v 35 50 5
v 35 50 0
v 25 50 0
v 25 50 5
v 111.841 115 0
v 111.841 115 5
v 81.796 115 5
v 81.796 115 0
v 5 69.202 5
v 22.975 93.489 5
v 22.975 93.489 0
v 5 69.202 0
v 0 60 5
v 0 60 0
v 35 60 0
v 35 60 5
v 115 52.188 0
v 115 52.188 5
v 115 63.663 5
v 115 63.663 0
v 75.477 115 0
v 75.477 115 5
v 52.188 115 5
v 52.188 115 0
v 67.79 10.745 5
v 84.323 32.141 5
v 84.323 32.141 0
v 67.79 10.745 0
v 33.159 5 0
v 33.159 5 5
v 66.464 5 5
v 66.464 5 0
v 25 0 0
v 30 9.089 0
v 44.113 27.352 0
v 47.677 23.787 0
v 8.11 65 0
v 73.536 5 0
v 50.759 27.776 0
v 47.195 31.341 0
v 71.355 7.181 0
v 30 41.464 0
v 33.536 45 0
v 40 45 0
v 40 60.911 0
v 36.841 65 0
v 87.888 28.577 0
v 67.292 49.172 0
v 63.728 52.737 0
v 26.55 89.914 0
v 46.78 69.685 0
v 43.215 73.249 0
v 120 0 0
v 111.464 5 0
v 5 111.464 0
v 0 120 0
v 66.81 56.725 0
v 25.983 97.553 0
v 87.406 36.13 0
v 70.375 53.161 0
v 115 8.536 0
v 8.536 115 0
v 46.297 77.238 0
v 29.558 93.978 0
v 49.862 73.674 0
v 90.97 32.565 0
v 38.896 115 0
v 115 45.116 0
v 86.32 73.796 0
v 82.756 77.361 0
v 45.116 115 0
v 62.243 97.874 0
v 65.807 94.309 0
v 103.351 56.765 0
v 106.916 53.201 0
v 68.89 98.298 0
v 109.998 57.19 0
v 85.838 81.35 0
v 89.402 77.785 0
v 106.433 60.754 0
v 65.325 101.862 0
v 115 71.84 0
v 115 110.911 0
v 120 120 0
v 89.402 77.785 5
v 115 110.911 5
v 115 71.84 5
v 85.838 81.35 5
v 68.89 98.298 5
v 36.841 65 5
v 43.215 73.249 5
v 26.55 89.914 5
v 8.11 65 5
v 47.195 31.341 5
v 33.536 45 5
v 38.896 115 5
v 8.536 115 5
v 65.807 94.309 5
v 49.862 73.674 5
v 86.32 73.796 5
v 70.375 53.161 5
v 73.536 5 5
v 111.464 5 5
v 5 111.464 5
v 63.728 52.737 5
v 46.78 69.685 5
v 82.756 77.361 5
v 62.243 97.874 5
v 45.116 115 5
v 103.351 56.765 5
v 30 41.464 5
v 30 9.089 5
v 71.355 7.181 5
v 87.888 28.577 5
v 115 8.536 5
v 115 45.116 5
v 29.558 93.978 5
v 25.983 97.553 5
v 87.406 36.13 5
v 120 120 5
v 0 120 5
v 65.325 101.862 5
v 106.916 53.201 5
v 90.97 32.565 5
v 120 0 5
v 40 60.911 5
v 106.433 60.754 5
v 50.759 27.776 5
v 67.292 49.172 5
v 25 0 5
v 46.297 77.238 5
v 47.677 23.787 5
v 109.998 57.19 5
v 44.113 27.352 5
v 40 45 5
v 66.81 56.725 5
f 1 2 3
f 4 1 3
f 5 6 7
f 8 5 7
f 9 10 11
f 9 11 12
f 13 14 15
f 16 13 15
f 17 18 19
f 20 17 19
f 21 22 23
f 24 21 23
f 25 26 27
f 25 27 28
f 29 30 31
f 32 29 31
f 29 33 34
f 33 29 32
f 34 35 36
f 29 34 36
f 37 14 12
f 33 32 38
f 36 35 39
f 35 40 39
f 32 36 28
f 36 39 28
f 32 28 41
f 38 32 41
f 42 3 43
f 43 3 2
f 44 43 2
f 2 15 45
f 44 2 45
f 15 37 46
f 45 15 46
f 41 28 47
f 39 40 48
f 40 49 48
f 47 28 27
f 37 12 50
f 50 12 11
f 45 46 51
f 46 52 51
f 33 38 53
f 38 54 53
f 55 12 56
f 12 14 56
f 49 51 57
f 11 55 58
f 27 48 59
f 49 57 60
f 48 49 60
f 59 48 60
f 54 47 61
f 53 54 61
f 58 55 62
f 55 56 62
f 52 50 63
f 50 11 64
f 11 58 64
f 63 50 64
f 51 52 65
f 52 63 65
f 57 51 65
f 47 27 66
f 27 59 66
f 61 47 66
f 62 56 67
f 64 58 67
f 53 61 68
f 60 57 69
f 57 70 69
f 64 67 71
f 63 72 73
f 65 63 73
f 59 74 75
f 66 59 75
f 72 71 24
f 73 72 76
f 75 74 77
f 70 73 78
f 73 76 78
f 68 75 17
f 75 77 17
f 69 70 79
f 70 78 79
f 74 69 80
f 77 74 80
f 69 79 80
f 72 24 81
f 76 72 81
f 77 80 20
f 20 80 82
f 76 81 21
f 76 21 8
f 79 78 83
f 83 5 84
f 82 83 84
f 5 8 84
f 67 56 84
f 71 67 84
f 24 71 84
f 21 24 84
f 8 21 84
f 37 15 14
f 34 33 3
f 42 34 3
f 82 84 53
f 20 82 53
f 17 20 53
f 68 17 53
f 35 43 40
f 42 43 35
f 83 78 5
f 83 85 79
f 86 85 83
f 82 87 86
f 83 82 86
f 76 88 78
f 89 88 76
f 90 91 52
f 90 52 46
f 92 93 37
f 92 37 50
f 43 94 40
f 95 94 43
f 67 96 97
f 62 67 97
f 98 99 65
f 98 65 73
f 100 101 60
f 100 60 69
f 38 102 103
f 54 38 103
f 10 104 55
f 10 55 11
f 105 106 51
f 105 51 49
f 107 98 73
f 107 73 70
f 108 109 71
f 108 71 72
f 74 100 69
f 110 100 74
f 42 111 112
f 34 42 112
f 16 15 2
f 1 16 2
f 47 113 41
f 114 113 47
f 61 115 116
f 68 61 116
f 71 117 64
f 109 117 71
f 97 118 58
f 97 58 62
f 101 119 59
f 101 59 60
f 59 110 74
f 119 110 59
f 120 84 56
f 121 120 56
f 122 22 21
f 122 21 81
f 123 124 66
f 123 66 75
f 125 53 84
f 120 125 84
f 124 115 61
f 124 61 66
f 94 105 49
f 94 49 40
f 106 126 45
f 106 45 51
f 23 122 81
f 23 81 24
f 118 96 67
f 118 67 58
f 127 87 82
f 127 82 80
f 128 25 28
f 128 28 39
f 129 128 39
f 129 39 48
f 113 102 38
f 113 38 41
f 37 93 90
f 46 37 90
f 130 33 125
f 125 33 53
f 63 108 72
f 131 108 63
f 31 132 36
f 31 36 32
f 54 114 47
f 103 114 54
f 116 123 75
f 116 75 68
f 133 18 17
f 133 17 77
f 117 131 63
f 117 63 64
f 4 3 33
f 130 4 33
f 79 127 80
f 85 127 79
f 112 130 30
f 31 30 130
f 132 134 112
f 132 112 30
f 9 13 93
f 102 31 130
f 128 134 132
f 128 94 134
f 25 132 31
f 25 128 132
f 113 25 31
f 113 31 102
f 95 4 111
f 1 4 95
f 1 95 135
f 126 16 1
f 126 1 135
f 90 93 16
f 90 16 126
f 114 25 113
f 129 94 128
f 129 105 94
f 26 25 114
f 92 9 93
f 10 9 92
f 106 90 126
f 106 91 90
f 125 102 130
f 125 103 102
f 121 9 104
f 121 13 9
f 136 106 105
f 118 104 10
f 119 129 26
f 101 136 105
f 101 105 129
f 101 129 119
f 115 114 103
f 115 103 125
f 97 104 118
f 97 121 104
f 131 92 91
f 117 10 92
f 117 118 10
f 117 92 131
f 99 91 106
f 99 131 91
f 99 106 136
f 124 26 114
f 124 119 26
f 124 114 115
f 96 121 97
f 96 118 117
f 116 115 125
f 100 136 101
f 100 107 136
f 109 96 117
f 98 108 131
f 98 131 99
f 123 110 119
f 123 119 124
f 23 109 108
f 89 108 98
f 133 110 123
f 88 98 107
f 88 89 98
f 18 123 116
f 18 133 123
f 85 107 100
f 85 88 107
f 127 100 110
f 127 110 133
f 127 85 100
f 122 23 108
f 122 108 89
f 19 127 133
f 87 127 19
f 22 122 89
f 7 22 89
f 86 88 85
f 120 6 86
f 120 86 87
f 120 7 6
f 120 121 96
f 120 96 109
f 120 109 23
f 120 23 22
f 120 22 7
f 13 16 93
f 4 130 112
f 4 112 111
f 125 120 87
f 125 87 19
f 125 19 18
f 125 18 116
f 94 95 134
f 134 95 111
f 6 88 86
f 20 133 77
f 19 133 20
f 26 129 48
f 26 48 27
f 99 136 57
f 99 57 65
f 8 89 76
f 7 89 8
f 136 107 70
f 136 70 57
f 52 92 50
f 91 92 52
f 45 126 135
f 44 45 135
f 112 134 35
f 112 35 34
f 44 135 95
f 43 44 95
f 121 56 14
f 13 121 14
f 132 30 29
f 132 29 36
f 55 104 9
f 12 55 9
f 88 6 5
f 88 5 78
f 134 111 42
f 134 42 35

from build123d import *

# Parameters (mm, degrees)
F1_DEPTH  = 5
F3_DEPTH  = 25
F5_DEPTH  = 5
F7_DEPTH  = 5
F9_DEPTH  = 5
F11_DEPTH = 5
F13_DEPTH = 5
F15_DEPTH = 5
F17_DEPTH = 5


with BuildPart() as f1:
    # F0 (on Top) → F1 (new body)
    with BuildSketch(Plane.XY):
        Polygon((120, 120), (0, 120), (0, 60), (35, 60), (35, 50), (25, 50), (25, 0), (120, 0), align=None)
    extrude(amount=F1_DEPTH)

    # F2 (on face) → F3 (cut)
    with BuildSketch(Plane.XY.offset(5)):
        Polygon((5, 115), (5, 65), (40, 65), (40, 45), (30, 45), (30, 5), (115, 5), (115, 115), align=None)
    extrude(amount=-F3_DEPTH, mode=Mode.SUBTRACT)

    # F4 (on face) → F5 (join)
    with BuildSketch(Plane.XY.offset(5)):
        Polygon((115, 8.5355339059), (8.5355339059, 115), (5, 115), (5, 111.4644660941), (111.4644660941, 5), (115, 5), align=None)
    extrude(amount=-F5_DEPTH)

    # F6 (on face) → F7 (join)
    with BuildSketch(Plane.XY.offset(5)):
        Polygon((70.3746479557, 53.1608859502), (115, 110.9113415369), (115, 115), (111.8405820967, 115), (66.8101764751, 56.7253574308), align=None)
        Polygon((67.2923876275, 49.1720784666), (70.3746479557, 53.1608859502), (66.8101764751, 56.7253574308), (63.7279161468, 52.7365499472), align=None)
        Polygon((33.1594179033, 5), (67.2923876275, 49.1720784666), (63.7279161468, 52.7365499472), (30, 9.0886584631), (30, 5), align=None)
    extrude(amount=-F7_DEPTH)

    # F8 (on face) → F9 (join)
    with BuildSketch(Plane.XY.offset(5)):
        Polygon((46.2973559623, 77.2381779437), (49.8618274429, 73.673706463), (81.7957815396, 115), (75.4769457331, 115), align=None)
        Polygon((43.215095634, 73.24937046), (46.7795671147, 69.6848989794), (49.8618274429, 73.673706463), (46.2973559623, 77.2381779437), align=None)
        Polygon((40, 65), (40, 60.9113415369), (46.7795671147, 69.6848989794), (43.215095634, 73.24937046), (36.8405820967, 65), align=None)
    extrude(amount=-F9_DEPTH)

    # F10 (on face) → F11 (join)
    with BuildSketch(Plane.XY.offset(5)):
        Polygon((25.9828204872, 97.5527134187), (29.5575639886, 93.9779699173), (45.1164897233, 115), (38.8959899157, 115), align=None)
        Polygon((22.9752933056, 93.4891727885), (26.550036807, 89.914429287), (29.5575639886, 93.9779699173), (25.9828204872, 97.5527134187), align=None)
        Polygon((5, 65), (8.1102499038, 65), (26.550036807, 89.914429287), (22.9752933056, 93.4891727885), (5, 69.2023317134), align=None)
    extrude(amount=-F11_DEPTH)

    # F12 (on face) → F13 (join)
    with BuildSketch(Plane.XY.offset(5)):
        Polygon((30, 45), (30, 41.4644660941), (44.1125315315, 27.3519345626), (47.1947918597, 31.3407420462), (33.5355339059, 45), align=None)
        Polygon((47.1947918597, 31.3407420462), (44.1125315315, 27.3519345626), (47.6770030121, 23.787463082), (50.7592633403, 27.7762705656), align=None)
        Polygon((50.7592633403, 27.7762705656), (47.6770030121, 23.787463082), (66.4644660941, 5), (73.5355339059, 5), align=None)
    extrude(amount=-F13_DEPTH)

    # F14 (on face) → F15 (join)
    with BuildSketch(Plane.XY.offset(5)):
        Polygon((52.1875575351, 115), (45.1164897233, 115), (62.2429008057, 97.8735889176), (65.325161134, 101.8623964012), align=None)
        Polygon((65.325161134, 101.8623964012), (62.2429008057, 97.8735889176), (65.8073722864, 94.3091174369), (68.8896326146, 98.2979249205), align=None)
        Polygon((68.8896326146, 98.2979249205), (65.8073722864, 94.3091174369), (82.7557213186, 77.3607684047), (85.8379816468, 81.3495758883), align=None)
        Polygon((89.4024531274, 77.7851044077), (86.3201927992, 73.7962969241), (115, 45.1164897233), (115, 52.1875575351), align=None)
        Polygon((85.8379816468, 81.3495758883), (82.7557213186, 77.3607684047), (86.3201927992, 73.7962969241), (89.4024531274, 77.7851044077), align=None)
    extrude(amount=-F15_DEPTH)

    # F16 (on face) → F17 (join)
    with BuildSketch(Plane.XY.offset(5)):
        Polygon((115, 71.8401578906), (106.4334818964, 60.7540756388), (109.997953377, 57.1896041582), (115, 63.6628409644), align=None)
        Polygon((106.4334818964, 60.7540756388), (103.3512215681, 56.7652681552), (106.9156930487, 53.2007966745), (109.997953377, 57.1896041582), align=None)
        Polygon((103.3512215681, 56.7652681552), (87.4056767246, 36.1298571813), (90.9701482053, 32.5653857007), (106.9156930487, 53.2007966745), align=None)
        Polygon((87.4056767246, 36.1298571813), (84.3234163964, 32.1410496977), (87.887887877, 28.576578217), (90.9701482053, 32.5653857007), align=None)
        Polygon((84.3234163964, 32.1410496977), (67.7902921093, 10.7452417967), (71.3547635899, 7.180770316), (87.887887877, 28.576578217), align=None)
    extrude(amount=-F17_DEPTH)


solid = f1.part
